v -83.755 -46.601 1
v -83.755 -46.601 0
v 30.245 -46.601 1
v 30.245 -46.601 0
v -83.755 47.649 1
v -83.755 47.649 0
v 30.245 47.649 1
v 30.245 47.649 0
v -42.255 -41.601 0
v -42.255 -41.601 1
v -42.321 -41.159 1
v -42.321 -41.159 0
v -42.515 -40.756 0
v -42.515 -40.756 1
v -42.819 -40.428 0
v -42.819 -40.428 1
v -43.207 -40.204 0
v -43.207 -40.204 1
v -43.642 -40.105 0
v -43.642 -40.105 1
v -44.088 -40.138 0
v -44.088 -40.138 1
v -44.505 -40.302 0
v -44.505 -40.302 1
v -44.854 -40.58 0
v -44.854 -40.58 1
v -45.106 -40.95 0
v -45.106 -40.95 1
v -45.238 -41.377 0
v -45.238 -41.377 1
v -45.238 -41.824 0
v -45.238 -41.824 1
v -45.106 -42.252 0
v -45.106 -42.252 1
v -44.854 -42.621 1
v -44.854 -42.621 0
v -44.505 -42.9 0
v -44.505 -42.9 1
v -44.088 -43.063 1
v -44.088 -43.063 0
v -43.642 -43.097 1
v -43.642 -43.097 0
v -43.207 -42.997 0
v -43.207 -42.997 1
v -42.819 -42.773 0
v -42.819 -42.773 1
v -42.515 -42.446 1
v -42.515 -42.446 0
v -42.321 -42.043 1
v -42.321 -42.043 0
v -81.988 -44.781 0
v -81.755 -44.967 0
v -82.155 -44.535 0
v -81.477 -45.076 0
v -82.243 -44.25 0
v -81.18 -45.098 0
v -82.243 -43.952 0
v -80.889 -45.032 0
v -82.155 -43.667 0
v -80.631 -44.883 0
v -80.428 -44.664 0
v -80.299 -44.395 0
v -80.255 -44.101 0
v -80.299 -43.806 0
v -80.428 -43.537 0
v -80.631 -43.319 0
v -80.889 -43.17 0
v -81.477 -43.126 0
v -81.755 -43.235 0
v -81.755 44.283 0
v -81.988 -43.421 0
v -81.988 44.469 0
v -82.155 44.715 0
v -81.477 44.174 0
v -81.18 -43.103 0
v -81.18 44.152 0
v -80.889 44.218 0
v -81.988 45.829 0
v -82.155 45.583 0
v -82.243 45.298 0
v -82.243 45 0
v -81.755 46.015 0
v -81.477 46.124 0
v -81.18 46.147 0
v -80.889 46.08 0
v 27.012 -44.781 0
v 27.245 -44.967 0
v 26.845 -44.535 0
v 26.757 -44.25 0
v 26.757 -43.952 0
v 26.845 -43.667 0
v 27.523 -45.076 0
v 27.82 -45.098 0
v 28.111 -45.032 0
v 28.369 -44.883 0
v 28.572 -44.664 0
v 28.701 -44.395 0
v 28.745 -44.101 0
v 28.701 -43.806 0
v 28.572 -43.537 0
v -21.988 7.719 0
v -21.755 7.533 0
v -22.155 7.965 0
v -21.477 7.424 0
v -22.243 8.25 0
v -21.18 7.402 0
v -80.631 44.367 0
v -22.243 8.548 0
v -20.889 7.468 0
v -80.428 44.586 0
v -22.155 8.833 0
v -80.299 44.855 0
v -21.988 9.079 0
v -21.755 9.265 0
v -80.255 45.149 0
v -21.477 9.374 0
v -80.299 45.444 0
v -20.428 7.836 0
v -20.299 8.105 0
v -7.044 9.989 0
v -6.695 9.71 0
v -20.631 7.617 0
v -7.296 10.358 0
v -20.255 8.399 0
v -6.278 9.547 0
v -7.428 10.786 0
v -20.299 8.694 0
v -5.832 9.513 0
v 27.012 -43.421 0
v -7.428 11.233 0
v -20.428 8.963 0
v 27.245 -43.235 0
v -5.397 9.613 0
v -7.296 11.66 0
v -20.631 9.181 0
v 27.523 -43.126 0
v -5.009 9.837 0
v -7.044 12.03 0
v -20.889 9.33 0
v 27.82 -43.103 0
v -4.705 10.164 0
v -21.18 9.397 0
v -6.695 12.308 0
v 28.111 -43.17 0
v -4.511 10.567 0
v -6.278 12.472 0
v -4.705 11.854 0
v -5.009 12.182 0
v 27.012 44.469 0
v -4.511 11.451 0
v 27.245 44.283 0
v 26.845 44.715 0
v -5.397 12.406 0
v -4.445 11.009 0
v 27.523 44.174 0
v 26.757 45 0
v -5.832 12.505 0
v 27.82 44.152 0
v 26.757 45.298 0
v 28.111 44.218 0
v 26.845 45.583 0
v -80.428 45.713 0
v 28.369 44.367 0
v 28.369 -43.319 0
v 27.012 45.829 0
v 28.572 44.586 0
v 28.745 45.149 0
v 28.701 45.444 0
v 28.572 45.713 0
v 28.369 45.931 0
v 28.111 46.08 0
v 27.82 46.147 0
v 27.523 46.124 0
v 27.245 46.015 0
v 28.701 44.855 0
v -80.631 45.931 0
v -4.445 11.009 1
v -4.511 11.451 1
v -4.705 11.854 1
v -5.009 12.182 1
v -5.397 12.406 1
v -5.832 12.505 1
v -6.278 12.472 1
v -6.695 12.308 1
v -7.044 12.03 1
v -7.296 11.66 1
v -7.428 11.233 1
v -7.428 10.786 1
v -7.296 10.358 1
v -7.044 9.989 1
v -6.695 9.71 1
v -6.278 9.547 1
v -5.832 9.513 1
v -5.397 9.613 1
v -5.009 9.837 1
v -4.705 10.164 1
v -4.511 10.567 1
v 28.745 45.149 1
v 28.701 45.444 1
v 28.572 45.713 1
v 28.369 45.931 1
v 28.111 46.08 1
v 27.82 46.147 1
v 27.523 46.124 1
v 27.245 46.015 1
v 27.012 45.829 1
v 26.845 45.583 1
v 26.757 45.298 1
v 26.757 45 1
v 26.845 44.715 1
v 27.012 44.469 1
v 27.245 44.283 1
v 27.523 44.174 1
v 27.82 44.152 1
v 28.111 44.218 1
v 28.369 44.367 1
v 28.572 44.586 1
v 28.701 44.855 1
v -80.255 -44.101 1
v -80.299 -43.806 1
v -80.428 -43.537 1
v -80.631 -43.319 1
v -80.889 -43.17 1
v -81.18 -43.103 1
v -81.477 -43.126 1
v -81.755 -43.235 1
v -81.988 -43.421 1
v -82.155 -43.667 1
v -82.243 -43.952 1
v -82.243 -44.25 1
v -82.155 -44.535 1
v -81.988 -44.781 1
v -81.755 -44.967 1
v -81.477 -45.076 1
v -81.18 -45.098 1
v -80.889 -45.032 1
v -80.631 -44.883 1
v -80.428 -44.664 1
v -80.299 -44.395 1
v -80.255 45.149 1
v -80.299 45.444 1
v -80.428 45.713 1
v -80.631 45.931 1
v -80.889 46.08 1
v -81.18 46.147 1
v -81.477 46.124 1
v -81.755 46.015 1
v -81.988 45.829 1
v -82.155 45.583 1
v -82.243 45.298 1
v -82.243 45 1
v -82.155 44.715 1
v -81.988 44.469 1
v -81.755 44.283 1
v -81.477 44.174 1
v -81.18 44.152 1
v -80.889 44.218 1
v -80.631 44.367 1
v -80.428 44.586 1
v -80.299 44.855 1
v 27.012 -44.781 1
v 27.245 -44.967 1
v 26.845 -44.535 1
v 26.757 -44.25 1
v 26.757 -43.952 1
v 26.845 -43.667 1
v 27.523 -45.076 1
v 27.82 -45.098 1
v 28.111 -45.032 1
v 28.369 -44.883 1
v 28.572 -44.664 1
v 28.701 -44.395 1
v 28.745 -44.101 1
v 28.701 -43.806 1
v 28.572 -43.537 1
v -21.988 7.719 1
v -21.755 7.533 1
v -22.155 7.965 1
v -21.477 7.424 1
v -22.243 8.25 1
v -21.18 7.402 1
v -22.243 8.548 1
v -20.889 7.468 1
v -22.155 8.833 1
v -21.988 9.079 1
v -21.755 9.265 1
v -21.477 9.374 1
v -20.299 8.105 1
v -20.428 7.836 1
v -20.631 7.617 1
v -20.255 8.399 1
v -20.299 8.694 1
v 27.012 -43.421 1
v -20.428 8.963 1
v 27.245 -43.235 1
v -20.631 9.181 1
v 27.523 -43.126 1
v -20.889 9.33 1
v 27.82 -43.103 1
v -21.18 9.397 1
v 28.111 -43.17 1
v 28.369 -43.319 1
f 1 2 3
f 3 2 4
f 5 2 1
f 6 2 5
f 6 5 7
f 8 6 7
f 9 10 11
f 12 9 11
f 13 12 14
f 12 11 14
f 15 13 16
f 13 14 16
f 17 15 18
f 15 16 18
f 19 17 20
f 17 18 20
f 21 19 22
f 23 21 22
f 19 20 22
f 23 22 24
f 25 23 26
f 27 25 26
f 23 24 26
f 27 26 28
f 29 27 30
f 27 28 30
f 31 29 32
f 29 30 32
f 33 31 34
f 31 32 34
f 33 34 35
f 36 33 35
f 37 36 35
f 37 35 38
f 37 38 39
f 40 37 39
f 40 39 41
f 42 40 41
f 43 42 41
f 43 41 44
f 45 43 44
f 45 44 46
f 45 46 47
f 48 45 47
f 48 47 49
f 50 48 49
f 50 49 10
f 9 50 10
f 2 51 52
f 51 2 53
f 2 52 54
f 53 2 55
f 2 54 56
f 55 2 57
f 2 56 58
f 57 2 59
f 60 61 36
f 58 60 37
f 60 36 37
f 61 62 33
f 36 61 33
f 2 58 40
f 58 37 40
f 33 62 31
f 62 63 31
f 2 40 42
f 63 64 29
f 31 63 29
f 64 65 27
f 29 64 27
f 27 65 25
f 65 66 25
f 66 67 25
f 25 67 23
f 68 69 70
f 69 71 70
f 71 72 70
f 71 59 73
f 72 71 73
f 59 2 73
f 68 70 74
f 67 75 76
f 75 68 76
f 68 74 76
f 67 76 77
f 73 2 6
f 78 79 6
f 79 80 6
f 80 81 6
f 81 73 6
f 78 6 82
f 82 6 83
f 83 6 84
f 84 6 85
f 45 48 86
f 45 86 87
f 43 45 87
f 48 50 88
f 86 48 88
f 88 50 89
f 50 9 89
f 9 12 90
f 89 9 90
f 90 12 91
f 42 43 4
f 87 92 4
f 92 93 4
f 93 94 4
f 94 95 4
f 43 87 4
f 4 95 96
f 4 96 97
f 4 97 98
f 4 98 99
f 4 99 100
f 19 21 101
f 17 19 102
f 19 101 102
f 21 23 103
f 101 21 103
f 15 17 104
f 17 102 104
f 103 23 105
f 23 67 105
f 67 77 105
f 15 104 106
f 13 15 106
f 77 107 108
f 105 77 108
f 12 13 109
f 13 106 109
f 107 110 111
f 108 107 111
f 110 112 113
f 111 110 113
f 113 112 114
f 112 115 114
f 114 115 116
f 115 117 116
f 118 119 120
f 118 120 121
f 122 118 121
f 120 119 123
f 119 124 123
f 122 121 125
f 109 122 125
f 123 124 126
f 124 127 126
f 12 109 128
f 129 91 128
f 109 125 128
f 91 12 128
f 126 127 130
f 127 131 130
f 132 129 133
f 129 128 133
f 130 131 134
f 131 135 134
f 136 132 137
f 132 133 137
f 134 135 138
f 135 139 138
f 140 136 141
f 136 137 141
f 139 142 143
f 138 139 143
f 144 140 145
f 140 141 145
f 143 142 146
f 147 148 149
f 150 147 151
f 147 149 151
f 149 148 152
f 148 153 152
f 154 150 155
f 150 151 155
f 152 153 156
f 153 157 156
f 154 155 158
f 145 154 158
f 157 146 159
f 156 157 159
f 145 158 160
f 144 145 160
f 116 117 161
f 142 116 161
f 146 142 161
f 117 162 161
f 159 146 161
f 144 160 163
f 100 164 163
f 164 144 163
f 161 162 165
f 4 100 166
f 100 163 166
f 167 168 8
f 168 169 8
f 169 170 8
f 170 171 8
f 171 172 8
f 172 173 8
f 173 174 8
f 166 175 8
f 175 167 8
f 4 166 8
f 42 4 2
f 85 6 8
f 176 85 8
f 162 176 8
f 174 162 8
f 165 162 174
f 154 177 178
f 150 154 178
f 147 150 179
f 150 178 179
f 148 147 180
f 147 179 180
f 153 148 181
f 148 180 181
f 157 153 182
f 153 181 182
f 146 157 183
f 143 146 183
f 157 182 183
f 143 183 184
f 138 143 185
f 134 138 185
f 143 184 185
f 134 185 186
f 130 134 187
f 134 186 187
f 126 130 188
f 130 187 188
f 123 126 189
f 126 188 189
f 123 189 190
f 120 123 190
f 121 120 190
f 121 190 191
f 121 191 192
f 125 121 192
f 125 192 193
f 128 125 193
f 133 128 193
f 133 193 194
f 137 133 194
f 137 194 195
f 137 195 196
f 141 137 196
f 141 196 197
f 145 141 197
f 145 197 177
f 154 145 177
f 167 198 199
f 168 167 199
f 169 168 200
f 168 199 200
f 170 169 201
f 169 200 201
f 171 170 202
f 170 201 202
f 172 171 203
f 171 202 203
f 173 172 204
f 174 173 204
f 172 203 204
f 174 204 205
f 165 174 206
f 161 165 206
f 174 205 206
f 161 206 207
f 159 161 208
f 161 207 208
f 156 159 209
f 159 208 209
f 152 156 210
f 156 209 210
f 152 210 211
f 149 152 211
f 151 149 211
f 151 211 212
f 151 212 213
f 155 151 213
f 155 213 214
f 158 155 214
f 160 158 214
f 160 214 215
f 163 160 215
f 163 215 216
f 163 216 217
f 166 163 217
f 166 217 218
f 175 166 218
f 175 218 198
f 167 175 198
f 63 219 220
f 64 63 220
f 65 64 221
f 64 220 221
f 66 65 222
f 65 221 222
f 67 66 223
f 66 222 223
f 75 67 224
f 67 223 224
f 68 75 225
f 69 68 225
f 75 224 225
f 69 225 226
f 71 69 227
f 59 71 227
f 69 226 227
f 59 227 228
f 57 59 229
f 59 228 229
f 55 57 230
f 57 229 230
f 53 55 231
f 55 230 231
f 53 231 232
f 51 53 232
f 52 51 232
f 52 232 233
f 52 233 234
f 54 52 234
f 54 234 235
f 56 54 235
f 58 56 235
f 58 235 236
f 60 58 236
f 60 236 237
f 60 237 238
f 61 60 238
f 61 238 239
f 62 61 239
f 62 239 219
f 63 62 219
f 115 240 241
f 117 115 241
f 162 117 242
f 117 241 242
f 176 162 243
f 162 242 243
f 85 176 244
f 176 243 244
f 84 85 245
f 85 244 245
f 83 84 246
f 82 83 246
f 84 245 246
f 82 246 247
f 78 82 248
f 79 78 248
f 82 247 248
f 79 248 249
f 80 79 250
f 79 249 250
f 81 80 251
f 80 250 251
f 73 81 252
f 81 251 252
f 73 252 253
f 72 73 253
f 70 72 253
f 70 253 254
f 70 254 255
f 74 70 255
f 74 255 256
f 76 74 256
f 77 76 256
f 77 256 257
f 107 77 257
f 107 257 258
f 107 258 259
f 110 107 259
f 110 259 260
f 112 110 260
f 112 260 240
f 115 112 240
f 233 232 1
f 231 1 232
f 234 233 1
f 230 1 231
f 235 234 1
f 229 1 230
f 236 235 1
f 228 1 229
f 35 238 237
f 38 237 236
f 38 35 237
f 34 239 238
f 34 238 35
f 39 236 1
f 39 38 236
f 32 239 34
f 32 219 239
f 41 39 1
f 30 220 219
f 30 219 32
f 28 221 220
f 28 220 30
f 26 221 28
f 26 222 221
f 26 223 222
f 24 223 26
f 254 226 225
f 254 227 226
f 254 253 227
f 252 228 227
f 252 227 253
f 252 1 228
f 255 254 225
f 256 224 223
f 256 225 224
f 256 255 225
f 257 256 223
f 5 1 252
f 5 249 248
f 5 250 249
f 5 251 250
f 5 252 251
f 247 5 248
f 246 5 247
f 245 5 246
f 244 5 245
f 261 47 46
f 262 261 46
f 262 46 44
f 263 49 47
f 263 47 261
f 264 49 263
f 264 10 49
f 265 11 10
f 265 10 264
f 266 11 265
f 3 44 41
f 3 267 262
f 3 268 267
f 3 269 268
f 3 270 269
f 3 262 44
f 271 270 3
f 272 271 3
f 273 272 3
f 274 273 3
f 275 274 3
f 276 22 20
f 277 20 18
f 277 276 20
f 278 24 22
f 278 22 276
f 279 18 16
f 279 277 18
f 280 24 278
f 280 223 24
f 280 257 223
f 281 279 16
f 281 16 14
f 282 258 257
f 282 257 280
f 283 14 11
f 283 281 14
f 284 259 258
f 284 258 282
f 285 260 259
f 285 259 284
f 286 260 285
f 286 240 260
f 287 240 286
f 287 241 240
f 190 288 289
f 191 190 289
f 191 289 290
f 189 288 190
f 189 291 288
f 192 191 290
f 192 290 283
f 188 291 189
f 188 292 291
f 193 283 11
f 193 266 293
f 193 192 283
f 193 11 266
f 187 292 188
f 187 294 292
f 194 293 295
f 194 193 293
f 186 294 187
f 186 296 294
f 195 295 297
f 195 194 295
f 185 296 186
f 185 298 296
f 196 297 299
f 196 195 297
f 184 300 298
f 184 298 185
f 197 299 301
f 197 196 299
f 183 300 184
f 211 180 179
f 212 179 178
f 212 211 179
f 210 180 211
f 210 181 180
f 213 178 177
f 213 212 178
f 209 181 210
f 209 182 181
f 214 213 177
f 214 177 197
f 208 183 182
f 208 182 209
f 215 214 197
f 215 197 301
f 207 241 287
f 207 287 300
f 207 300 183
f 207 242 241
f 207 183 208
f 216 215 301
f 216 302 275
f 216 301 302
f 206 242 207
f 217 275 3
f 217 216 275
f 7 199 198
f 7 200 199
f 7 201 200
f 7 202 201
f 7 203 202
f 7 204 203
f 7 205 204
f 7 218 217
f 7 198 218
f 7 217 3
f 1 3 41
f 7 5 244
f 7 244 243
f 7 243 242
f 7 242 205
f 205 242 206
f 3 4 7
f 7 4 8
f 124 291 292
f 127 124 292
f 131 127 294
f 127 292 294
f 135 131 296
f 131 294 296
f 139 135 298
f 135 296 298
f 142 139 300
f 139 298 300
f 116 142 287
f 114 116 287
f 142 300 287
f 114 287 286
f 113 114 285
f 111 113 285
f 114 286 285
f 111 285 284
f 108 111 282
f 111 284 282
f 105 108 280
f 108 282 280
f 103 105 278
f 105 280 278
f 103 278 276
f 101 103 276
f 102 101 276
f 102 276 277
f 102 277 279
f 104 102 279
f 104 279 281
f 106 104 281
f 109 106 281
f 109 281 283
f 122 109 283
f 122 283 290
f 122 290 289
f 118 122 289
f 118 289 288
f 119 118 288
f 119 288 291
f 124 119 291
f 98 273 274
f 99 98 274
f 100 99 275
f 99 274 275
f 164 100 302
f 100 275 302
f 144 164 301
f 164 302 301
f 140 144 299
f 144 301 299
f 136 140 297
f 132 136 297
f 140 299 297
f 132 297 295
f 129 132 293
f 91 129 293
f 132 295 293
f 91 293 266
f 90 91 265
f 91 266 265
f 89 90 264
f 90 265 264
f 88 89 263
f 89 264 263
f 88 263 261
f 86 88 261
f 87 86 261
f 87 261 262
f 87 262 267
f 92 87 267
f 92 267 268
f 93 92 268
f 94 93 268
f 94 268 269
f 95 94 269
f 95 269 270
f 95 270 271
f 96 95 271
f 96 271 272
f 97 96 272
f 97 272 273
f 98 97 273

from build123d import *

# Parameters (mm, degrees)
SKETCH1_W           = 114
SKETCH1_H           = 110
BOSS_EXTRUDE1_DEPTH = 1
SKETCH2_R           = 1
CUT_EXTRUDE1_DEPTH  = 2
SKETCH3_R           = 1
CUT_EXTRUDE2_DEPTH  = 10
SKETCH4_W           = 15.73492188
SKETCH4_H           = 20.720243664
BOSS_EXTRUDE2_DEPTH = 1
SKETCH6_R           = 1
CUT_EXTRUDE3_DEPTH  = 10
SKETCH7_R           = 1.5
CUT_EXTRUDE4_DEPTH  = 10
SKETCH8_R           = 1.5
CUT_EXTRUDE5_DEPTH  = 10
SKETCH9_R           = 1
CUT_EXTRUDE6_DEPTH  = 2
SKETCH10_R          = 1
CUT_EXTRUDE7_DEPTH  = 2
SKETCH11_W          = 114
SKETCH11_H          = 15.75
CUT_EXTRUDE8_DEPTH  = 2


with BuildPart() as part:
    # Sketch1 → Boss-Extrude1 (new body)
    with BuildSketch(Plane.XY):
        with Locations((-26.754516262, 8.399305556)):
            Rectangle(SKETCH1_W, SKETCH1_H)
    extrude(amount=BOSS_EXTRUDE1_DEPTH)

    # Sketch2 → Cut-Extrude1 (cut, through all)
    with BuildSketch(Plane.XY.offset(1)):
        with Locations((-81.254516262, 60.899305556)):
            Circle(SKETCH2_R)
        with Locations((27.745483738, 60.899305556)):
            Circle(SKETCH2_R)
        with Locations((27.745483738, -44.100694444)):
            Circle(SKETCH2_R)
        with Locations((-81.254516262, -44.100694444)):
            Circle(SKETCH2_R)
    extrude(amount=-CUT_EXTRUDE1_DEPTH, mode=Mode.SUBTRACT)

    # Sketch3 → Cut-Extrude2 (cut)
    with BuildSketch(Plane(origin=(0, 0, 0), x_dir=(-1, 0, 0), z_dir=(0, 0, -1))):
        with Locations((28.754516262, 11.899305556)):
            Circle(SKETCH3_R)
    extrude(amount=-CUT_EXTRUDE2_DEPTH, mode=Mode.SUBTRACT)

    # Sketch4 → Boss-Extrude2 (add, through all)
    with BuildSketch(Plane.XY.offset(1)):
        with Locations((-27.299785832, 6.529809887)):
            Rectangle(SKETCH4_W, SKETCH4_H)
    extrude(amount=-BOSS_EXTRUDE2_DEPTH)

    # Sketch6 → Cut-Extrude3 (cut)
    with BuildSketch(Plane.XY.offset(1)):
        with Locations((-21.254516262, 8.399305556)):
            Circle(SKETCH6_R)
    extrude(amount=-CUT_EXTRUDE3_DEPTH, mode=Mode.SUBTRACT)

    # Sketch7 → Cut-Extrude4 (cut)
    with BuildSketch(Plane.XY.offset(1)):
        with Locations((-43.754516262, -41.600694444)):
            Circle(SKETCH7_R)
    extrude(amount=-CUT_EXTRUDE4_DEPTH, mode=Mode.SUBTRACT)

    # Sketch8 → Cut-Extrude5 (cut)
    with BuildSketch(Plane.XY.offset(1)):
        with Locations((-5.944516262, 11.009305556)):
            Circle(SKETCH8_R)
    extrude(amount=-CUT_EXTRUDE5_DEPTH, mode=Mode.SUBTRACT)

    # Sketch9 → Cut-Extrude6 (cut, through all)
    with BuildSketch(Plane.XY.offset(1)):
        with Locations((-81.254516262, 45.149305556)):
            Circle(SKETCH9_R)
    extrude(amount=-CUT_EXTRUDE6_DEPTH, mode=Mode.SUBTRACT)

    # Sketch10 → Cut-Extrude7 (cut, through all)
    with BuildSketch(Plane.XY.offset(1)):
        with Locations((27.745483738, 45.149305556)):
            Circle(SKETCH10_R)
    extrude(amount=-CUT_EXTRUDE7_DEPTH, mode=Mode.SUBTRACT)

    # Sketch11 → Cut-Extrude8 (cut, through all)
    with BuildSketch(Plane.XY.offset(1)):
        with Locations((-26.754516262, 55.524305556)):
            Rectangle(SKETCH11_W, SKETCH11_H)
    extrude(amount=-CUT_EXTRUDE8_DEPTH, mode=Mode.SUBTRACT)


solid = part.part
